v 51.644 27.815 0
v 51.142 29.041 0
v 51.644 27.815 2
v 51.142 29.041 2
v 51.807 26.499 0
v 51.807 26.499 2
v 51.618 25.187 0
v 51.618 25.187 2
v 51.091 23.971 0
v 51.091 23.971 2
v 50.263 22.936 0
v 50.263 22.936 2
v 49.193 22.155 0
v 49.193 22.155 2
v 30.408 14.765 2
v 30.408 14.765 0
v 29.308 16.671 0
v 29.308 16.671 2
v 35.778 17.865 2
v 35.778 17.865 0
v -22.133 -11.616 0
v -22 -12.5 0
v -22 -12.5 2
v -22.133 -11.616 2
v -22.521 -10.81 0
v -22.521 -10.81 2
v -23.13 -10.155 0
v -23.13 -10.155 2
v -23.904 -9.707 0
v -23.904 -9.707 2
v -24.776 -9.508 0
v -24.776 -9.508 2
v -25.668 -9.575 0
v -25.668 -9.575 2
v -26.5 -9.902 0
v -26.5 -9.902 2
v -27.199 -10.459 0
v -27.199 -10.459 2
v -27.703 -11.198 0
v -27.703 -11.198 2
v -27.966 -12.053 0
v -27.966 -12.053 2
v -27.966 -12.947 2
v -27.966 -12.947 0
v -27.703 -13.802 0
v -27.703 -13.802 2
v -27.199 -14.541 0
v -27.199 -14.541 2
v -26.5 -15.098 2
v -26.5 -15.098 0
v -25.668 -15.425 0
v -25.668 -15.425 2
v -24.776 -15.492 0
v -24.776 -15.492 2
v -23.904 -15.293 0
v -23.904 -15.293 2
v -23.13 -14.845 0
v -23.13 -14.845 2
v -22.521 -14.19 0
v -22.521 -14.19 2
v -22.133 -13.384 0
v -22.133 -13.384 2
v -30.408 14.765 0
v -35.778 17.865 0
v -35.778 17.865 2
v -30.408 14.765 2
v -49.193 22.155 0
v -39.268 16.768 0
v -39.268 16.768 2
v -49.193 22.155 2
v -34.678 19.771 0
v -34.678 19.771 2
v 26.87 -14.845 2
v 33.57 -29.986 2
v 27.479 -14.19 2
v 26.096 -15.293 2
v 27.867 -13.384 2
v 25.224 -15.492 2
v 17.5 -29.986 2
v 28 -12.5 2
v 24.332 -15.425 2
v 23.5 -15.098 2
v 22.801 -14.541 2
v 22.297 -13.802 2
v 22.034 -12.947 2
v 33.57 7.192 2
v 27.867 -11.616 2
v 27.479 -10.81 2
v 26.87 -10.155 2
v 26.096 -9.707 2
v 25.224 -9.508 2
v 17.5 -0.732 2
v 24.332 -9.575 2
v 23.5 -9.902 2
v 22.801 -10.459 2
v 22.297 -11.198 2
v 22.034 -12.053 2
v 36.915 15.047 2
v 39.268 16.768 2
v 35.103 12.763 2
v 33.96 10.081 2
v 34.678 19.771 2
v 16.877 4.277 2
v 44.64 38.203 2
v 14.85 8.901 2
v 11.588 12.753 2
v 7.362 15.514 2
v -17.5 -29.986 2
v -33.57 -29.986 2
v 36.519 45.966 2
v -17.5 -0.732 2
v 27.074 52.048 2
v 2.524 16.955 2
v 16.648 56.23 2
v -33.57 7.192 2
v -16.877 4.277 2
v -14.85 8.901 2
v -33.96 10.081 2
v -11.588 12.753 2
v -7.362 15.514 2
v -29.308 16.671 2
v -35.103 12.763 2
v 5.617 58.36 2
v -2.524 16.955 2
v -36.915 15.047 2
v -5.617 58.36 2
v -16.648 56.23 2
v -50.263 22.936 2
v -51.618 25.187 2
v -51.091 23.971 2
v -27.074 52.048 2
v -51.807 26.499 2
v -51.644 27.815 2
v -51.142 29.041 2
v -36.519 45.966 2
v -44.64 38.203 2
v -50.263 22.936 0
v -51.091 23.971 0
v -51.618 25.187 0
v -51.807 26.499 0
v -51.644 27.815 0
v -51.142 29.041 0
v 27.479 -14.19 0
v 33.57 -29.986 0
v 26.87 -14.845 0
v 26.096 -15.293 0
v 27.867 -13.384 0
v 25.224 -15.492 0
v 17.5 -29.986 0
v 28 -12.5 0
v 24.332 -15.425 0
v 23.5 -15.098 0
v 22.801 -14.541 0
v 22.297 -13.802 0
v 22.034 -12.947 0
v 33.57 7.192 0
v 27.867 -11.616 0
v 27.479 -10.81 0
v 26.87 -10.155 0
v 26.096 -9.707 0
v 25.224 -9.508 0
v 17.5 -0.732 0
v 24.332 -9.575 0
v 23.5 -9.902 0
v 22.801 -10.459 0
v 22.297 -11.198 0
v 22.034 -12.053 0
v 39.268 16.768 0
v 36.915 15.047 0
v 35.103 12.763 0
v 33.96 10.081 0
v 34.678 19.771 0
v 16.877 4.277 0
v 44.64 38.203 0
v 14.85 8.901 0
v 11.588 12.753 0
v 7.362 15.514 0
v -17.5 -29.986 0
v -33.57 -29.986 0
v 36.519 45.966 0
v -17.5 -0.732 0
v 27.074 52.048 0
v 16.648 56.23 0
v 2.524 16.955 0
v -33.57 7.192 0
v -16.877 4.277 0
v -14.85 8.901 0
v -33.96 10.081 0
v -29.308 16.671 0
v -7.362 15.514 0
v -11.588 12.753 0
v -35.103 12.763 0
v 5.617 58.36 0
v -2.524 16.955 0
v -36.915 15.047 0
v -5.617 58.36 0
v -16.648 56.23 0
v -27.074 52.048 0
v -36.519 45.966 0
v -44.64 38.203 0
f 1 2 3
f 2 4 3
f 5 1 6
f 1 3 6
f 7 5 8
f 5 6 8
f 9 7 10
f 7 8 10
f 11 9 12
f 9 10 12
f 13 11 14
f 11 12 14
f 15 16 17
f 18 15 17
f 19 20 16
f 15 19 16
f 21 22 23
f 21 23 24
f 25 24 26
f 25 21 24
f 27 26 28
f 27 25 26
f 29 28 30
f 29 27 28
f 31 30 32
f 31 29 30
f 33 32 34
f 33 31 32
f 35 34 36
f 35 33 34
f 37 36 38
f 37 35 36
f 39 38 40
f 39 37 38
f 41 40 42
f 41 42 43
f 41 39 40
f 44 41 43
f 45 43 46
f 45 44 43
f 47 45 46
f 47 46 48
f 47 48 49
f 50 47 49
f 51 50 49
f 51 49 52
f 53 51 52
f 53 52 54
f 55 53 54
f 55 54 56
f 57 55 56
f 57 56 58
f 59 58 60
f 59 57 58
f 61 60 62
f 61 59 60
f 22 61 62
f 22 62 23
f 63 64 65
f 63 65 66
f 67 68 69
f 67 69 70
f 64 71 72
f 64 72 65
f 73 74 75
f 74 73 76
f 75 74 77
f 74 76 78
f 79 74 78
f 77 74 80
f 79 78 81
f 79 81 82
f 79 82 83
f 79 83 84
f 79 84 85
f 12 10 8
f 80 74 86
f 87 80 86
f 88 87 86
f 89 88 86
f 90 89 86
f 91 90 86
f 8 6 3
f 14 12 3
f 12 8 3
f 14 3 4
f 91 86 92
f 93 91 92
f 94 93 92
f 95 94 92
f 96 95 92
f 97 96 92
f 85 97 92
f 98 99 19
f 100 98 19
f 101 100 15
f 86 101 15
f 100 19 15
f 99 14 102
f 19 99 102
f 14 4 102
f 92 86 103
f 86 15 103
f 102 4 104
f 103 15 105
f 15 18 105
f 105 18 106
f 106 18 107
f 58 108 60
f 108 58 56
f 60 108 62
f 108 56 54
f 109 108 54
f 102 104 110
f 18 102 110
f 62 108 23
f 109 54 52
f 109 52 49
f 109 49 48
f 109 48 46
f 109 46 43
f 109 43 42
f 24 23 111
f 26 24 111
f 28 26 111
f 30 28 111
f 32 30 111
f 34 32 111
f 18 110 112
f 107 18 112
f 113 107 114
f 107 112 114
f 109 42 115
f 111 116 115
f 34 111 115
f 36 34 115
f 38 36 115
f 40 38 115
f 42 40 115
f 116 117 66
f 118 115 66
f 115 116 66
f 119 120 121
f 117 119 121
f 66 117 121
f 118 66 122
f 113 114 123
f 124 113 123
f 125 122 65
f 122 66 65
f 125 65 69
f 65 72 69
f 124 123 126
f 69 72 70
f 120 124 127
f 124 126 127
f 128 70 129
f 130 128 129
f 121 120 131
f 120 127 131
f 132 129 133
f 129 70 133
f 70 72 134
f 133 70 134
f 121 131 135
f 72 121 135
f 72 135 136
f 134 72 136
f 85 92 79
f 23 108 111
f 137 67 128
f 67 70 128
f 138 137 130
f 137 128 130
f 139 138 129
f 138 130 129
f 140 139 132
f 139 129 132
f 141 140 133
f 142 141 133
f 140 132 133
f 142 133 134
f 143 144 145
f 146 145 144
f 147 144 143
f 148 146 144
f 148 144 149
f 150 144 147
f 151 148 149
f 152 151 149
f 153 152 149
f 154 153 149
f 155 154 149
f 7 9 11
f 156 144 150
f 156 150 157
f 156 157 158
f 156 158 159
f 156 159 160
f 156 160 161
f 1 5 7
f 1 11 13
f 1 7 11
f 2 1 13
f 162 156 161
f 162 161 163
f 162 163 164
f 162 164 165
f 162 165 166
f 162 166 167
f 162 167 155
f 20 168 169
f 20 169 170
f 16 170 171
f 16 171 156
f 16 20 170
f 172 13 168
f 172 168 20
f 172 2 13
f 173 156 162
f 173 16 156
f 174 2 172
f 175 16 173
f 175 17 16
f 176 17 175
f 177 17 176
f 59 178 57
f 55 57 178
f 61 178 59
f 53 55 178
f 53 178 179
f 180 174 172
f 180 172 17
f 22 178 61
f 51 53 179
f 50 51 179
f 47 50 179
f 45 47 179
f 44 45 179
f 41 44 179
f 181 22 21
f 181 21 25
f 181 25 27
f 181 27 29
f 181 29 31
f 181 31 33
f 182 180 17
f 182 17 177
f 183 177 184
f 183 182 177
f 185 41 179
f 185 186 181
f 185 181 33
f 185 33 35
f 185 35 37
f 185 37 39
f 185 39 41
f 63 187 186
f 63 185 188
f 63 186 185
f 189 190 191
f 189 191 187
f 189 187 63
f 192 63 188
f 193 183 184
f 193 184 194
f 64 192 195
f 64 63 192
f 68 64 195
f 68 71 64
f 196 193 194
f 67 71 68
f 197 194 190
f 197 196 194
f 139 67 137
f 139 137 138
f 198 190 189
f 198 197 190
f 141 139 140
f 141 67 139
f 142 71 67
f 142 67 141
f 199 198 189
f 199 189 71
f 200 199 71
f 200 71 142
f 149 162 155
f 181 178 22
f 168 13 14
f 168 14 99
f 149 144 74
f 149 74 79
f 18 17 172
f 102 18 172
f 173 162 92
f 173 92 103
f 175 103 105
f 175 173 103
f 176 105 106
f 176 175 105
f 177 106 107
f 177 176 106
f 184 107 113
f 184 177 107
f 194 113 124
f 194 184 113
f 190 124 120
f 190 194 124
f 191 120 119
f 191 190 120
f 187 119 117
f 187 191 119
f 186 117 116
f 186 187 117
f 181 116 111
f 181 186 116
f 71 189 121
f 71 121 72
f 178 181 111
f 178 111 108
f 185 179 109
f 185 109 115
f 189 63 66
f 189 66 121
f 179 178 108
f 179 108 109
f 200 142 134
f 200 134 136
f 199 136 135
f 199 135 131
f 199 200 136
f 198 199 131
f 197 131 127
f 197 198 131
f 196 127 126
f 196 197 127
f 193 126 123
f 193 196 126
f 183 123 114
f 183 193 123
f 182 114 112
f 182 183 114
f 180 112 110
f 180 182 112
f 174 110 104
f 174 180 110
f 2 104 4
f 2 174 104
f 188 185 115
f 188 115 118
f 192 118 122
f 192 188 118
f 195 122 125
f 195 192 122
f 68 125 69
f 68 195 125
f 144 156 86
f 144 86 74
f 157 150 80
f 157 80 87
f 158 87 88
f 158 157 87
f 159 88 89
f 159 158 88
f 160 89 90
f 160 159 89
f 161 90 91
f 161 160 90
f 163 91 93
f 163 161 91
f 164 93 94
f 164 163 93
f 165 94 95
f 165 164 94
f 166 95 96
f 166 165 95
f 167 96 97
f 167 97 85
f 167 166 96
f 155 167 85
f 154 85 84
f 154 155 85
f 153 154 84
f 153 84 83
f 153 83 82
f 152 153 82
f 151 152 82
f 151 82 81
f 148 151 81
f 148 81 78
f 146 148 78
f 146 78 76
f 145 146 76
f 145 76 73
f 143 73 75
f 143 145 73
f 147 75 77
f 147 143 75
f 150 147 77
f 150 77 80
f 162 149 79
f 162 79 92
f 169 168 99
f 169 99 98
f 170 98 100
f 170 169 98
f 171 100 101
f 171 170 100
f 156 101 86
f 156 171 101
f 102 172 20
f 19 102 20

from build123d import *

# Parameters (mm, degrees)
SKETCH1_R           = 3
BOSS_EXTRUDE1_DEPTH = 2
FILLET1_R           = 5


with BuildPart() as part:
    # Sketch1 → Boss-Extrude1 (new body)
    with BuildSketch(Plane.XY):
        with BuildLine():
            Line((-17.5, -29.9861237), (-33.570384709, -29.9861237))
            Line((-33.570384709, -29.9861237), (-33.570384709, 7.191652864))
            ThreePointArc((-33.570384709, 7.191652864), (-35.102603086, 12.763157514), (-39.268321068, 16.767673829))
            Line((-39.268321068, 16.767673829), (-53.500564058, 24.492870138))
            ThreePointArc((-53.500564058, 24.492870138), (0, 58.627853025), (53.500564058, 24.492870138))
            Line((53.500564058, 24.492870138), (39.268321068, 16.767673829))
            ThreePointArc((39.268321068, 16.767673829), (35.102603086, 12.763157514), (33.570384709, 7.191652864))
            Line((33.570384709, 7.191652864), (33.570384709, -29.9861237))
            Line((33.570384709, -29.9861237), (17.5, -29.9861237))
            Line((17.5, -29.9861237), (17.5, -0.731973174))
            ThreePointArc((17.5, -0.731973174), (0, 17.137840029), (-17.5, -0.731973174))
            Line((-17.5, -0.731973174), (-17.5, -29.9861237))
        make_face()
        with Locations((-25, -12.5)):
            Circle(SKETCH1_R, mode=Mode.SUBTRACT)
        with Locations((25, -12.5)):
            Circle(SKETCH1_R, mode=Mode.SUBTRACT)
        Polygon((-35.777618692, 17.865360065), (-30.408261188, 14.765360065), (-29.308261188, 16.670615954), (-34.677618692, 19.770615954), align=None, mode=Mode.SUBTRACT)
        Polygon((30.408261188, 14.765360065), (29.308261188, 16.670615954), (34.677618692, 19.770615954), (35.777618692, 17.865360065), align=None, mode=Mode.SUBTRACT)
    extrude(amount=BOSS_EXTRUDE1_DEPTH)

    # Fillet1
    fillet1_edges = [part.edges().sort_by_distance(p)[0] for p in [
        (-53.500564058, 24.492870138, 1),
        (53.500564058, 24.492870138, 1),
    ]]
    fillet(fillet1_edges, radius=FILLET1_R)


solid = part.part
